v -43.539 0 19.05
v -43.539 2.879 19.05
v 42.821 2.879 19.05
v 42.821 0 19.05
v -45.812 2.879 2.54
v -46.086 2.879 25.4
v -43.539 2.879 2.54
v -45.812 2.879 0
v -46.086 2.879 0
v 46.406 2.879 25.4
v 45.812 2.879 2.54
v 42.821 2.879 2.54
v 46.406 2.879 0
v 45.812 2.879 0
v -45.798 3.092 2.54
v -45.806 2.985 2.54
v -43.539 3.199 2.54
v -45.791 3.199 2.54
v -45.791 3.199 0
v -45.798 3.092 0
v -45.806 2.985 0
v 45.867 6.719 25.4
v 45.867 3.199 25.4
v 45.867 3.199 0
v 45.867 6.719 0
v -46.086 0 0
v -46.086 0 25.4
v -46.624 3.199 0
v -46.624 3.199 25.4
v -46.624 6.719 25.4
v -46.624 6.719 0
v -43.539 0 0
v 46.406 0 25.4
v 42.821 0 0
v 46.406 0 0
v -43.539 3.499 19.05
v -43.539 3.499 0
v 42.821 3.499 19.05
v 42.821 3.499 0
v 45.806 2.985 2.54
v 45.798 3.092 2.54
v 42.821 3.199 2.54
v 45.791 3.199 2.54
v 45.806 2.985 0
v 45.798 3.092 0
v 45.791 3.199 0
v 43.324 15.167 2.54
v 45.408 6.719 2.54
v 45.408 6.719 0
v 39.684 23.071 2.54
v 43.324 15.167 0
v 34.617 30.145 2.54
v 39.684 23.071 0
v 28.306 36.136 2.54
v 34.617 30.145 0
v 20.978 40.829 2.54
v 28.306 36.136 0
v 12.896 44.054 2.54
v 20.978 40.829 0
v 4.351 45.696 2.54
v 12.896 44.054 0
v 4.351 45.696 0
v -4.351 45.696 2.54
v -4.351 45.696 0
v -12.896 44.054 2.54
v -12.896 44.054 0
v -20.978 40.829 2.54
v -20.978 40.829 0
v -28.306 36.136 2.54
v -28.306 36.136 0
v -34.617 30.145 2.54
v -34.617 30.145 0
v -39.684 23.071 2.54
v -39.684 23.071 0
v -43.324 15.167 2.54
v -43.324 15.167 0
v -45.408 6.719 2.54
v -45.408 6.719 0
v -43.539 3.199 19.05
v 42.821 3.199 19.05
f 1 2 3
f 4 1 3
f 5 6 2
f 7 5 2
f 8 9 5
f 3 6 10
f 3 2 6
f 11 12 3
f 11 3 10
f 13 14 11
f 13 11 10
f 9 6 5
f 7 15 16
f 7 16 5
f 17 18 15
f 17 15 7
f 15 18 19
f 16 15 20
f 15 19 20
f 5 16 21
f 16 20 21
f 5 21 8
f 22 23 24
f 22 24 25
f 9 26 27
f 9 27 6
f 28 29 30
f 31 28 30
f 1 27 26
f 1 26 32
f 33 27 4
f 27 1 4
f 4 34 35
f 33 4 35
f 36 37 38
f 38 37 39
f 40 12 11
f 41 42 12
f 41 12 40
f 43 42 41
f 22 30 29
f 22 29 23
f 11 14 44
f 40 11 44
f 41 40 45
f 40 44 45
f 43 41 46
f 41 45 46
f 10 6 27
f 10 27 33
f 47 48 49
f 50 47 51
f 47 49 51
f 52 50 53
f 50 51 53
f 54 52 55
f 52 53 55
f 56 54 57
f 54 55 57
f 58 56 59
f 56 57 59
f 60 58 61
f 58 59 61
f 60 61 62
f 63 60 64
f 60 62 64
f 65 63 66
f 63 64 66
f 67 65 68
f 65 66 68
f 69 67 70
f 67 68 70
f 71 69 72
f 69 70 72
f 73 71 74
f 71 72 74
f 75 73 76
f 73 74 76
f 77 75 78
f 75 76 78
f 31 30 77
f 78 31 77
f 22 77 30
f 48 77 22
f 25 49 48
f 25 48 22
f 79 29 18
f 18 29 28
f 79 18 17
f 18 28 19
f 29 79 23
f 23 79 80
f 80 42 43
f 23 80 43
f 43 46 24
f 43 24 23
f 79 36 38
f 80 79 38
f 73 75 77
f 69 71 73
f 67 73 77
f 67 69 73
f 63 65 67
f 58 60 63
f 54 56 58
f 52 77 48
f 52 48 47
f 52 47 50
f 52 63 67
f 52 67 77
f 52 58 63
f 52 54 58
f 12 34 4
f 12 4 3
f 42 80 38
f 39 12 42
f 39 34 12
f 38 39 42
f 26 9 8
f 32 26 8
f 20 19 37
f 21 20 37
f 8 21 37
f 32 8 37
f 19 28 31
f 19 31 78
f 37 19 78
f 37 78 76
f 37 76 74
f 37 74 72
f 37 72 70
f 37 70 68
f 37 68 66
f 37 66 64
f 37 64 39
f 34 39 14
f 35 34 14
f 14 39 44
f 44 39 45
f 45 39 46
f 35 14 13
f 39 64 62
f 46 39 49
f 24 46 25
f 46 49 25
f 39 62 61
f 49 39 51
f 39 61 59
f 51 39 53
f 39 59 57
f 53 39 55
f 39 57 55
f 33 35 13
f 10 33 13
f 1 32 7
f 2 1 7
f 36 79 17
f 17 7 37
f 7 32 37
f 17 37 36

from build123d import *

# Parameters (mm, degrees)
F1_DEPTH = 2.54
F2_W     = 92.49156
F2_H     = 2.878541
F3_DEPTH = 25.4
F4_W     = 92.49156
F4_H     = 3.52044
F5_DEPTH = 25.4
F6_W     = 86.36
F6_H     = 3.499337
F7_DEPTH = 19.05


with BuildPart() as f1:
    # F0 (on Top) → F1 (new body)
    with BuildSketch(Plane.XY):
        with BuildLine():
            Line((-45.902735, 0), (45.902735, 0))
            ThreePointArc((45.902735, 0), (0, 45.902735), (-45.902735, 0))
        make_face()
    extrude(amount=F1_DEPTH)

    # F2 (on Top) → F3 (join)
    with BuildSketch(Plane.XY):
        with Locations((0.16002, 1.43927)):
            Rectangle(F2_W, F2_H)
    extrude(amount=F3_DEPTH)

    # F4 (on Top) → F5 (join)
    with BuildSketch(Plane.XY):
        with Locations((-0.37846, 4.958801)):
            Rectangle(F4_W, F4_H)
    extrude(amount=F5_DEPTH)

    # F6 (on Top) → F7 (cut)
    with BuildSketch(Plane.XY):
        with Locations((-0.358611, 1.749668)):
            Rectangle(F6_W, F6_H)
    extrude(amount=F7_DEPTH, mode=Mode.SUBTRACT)


solid = f1.part
